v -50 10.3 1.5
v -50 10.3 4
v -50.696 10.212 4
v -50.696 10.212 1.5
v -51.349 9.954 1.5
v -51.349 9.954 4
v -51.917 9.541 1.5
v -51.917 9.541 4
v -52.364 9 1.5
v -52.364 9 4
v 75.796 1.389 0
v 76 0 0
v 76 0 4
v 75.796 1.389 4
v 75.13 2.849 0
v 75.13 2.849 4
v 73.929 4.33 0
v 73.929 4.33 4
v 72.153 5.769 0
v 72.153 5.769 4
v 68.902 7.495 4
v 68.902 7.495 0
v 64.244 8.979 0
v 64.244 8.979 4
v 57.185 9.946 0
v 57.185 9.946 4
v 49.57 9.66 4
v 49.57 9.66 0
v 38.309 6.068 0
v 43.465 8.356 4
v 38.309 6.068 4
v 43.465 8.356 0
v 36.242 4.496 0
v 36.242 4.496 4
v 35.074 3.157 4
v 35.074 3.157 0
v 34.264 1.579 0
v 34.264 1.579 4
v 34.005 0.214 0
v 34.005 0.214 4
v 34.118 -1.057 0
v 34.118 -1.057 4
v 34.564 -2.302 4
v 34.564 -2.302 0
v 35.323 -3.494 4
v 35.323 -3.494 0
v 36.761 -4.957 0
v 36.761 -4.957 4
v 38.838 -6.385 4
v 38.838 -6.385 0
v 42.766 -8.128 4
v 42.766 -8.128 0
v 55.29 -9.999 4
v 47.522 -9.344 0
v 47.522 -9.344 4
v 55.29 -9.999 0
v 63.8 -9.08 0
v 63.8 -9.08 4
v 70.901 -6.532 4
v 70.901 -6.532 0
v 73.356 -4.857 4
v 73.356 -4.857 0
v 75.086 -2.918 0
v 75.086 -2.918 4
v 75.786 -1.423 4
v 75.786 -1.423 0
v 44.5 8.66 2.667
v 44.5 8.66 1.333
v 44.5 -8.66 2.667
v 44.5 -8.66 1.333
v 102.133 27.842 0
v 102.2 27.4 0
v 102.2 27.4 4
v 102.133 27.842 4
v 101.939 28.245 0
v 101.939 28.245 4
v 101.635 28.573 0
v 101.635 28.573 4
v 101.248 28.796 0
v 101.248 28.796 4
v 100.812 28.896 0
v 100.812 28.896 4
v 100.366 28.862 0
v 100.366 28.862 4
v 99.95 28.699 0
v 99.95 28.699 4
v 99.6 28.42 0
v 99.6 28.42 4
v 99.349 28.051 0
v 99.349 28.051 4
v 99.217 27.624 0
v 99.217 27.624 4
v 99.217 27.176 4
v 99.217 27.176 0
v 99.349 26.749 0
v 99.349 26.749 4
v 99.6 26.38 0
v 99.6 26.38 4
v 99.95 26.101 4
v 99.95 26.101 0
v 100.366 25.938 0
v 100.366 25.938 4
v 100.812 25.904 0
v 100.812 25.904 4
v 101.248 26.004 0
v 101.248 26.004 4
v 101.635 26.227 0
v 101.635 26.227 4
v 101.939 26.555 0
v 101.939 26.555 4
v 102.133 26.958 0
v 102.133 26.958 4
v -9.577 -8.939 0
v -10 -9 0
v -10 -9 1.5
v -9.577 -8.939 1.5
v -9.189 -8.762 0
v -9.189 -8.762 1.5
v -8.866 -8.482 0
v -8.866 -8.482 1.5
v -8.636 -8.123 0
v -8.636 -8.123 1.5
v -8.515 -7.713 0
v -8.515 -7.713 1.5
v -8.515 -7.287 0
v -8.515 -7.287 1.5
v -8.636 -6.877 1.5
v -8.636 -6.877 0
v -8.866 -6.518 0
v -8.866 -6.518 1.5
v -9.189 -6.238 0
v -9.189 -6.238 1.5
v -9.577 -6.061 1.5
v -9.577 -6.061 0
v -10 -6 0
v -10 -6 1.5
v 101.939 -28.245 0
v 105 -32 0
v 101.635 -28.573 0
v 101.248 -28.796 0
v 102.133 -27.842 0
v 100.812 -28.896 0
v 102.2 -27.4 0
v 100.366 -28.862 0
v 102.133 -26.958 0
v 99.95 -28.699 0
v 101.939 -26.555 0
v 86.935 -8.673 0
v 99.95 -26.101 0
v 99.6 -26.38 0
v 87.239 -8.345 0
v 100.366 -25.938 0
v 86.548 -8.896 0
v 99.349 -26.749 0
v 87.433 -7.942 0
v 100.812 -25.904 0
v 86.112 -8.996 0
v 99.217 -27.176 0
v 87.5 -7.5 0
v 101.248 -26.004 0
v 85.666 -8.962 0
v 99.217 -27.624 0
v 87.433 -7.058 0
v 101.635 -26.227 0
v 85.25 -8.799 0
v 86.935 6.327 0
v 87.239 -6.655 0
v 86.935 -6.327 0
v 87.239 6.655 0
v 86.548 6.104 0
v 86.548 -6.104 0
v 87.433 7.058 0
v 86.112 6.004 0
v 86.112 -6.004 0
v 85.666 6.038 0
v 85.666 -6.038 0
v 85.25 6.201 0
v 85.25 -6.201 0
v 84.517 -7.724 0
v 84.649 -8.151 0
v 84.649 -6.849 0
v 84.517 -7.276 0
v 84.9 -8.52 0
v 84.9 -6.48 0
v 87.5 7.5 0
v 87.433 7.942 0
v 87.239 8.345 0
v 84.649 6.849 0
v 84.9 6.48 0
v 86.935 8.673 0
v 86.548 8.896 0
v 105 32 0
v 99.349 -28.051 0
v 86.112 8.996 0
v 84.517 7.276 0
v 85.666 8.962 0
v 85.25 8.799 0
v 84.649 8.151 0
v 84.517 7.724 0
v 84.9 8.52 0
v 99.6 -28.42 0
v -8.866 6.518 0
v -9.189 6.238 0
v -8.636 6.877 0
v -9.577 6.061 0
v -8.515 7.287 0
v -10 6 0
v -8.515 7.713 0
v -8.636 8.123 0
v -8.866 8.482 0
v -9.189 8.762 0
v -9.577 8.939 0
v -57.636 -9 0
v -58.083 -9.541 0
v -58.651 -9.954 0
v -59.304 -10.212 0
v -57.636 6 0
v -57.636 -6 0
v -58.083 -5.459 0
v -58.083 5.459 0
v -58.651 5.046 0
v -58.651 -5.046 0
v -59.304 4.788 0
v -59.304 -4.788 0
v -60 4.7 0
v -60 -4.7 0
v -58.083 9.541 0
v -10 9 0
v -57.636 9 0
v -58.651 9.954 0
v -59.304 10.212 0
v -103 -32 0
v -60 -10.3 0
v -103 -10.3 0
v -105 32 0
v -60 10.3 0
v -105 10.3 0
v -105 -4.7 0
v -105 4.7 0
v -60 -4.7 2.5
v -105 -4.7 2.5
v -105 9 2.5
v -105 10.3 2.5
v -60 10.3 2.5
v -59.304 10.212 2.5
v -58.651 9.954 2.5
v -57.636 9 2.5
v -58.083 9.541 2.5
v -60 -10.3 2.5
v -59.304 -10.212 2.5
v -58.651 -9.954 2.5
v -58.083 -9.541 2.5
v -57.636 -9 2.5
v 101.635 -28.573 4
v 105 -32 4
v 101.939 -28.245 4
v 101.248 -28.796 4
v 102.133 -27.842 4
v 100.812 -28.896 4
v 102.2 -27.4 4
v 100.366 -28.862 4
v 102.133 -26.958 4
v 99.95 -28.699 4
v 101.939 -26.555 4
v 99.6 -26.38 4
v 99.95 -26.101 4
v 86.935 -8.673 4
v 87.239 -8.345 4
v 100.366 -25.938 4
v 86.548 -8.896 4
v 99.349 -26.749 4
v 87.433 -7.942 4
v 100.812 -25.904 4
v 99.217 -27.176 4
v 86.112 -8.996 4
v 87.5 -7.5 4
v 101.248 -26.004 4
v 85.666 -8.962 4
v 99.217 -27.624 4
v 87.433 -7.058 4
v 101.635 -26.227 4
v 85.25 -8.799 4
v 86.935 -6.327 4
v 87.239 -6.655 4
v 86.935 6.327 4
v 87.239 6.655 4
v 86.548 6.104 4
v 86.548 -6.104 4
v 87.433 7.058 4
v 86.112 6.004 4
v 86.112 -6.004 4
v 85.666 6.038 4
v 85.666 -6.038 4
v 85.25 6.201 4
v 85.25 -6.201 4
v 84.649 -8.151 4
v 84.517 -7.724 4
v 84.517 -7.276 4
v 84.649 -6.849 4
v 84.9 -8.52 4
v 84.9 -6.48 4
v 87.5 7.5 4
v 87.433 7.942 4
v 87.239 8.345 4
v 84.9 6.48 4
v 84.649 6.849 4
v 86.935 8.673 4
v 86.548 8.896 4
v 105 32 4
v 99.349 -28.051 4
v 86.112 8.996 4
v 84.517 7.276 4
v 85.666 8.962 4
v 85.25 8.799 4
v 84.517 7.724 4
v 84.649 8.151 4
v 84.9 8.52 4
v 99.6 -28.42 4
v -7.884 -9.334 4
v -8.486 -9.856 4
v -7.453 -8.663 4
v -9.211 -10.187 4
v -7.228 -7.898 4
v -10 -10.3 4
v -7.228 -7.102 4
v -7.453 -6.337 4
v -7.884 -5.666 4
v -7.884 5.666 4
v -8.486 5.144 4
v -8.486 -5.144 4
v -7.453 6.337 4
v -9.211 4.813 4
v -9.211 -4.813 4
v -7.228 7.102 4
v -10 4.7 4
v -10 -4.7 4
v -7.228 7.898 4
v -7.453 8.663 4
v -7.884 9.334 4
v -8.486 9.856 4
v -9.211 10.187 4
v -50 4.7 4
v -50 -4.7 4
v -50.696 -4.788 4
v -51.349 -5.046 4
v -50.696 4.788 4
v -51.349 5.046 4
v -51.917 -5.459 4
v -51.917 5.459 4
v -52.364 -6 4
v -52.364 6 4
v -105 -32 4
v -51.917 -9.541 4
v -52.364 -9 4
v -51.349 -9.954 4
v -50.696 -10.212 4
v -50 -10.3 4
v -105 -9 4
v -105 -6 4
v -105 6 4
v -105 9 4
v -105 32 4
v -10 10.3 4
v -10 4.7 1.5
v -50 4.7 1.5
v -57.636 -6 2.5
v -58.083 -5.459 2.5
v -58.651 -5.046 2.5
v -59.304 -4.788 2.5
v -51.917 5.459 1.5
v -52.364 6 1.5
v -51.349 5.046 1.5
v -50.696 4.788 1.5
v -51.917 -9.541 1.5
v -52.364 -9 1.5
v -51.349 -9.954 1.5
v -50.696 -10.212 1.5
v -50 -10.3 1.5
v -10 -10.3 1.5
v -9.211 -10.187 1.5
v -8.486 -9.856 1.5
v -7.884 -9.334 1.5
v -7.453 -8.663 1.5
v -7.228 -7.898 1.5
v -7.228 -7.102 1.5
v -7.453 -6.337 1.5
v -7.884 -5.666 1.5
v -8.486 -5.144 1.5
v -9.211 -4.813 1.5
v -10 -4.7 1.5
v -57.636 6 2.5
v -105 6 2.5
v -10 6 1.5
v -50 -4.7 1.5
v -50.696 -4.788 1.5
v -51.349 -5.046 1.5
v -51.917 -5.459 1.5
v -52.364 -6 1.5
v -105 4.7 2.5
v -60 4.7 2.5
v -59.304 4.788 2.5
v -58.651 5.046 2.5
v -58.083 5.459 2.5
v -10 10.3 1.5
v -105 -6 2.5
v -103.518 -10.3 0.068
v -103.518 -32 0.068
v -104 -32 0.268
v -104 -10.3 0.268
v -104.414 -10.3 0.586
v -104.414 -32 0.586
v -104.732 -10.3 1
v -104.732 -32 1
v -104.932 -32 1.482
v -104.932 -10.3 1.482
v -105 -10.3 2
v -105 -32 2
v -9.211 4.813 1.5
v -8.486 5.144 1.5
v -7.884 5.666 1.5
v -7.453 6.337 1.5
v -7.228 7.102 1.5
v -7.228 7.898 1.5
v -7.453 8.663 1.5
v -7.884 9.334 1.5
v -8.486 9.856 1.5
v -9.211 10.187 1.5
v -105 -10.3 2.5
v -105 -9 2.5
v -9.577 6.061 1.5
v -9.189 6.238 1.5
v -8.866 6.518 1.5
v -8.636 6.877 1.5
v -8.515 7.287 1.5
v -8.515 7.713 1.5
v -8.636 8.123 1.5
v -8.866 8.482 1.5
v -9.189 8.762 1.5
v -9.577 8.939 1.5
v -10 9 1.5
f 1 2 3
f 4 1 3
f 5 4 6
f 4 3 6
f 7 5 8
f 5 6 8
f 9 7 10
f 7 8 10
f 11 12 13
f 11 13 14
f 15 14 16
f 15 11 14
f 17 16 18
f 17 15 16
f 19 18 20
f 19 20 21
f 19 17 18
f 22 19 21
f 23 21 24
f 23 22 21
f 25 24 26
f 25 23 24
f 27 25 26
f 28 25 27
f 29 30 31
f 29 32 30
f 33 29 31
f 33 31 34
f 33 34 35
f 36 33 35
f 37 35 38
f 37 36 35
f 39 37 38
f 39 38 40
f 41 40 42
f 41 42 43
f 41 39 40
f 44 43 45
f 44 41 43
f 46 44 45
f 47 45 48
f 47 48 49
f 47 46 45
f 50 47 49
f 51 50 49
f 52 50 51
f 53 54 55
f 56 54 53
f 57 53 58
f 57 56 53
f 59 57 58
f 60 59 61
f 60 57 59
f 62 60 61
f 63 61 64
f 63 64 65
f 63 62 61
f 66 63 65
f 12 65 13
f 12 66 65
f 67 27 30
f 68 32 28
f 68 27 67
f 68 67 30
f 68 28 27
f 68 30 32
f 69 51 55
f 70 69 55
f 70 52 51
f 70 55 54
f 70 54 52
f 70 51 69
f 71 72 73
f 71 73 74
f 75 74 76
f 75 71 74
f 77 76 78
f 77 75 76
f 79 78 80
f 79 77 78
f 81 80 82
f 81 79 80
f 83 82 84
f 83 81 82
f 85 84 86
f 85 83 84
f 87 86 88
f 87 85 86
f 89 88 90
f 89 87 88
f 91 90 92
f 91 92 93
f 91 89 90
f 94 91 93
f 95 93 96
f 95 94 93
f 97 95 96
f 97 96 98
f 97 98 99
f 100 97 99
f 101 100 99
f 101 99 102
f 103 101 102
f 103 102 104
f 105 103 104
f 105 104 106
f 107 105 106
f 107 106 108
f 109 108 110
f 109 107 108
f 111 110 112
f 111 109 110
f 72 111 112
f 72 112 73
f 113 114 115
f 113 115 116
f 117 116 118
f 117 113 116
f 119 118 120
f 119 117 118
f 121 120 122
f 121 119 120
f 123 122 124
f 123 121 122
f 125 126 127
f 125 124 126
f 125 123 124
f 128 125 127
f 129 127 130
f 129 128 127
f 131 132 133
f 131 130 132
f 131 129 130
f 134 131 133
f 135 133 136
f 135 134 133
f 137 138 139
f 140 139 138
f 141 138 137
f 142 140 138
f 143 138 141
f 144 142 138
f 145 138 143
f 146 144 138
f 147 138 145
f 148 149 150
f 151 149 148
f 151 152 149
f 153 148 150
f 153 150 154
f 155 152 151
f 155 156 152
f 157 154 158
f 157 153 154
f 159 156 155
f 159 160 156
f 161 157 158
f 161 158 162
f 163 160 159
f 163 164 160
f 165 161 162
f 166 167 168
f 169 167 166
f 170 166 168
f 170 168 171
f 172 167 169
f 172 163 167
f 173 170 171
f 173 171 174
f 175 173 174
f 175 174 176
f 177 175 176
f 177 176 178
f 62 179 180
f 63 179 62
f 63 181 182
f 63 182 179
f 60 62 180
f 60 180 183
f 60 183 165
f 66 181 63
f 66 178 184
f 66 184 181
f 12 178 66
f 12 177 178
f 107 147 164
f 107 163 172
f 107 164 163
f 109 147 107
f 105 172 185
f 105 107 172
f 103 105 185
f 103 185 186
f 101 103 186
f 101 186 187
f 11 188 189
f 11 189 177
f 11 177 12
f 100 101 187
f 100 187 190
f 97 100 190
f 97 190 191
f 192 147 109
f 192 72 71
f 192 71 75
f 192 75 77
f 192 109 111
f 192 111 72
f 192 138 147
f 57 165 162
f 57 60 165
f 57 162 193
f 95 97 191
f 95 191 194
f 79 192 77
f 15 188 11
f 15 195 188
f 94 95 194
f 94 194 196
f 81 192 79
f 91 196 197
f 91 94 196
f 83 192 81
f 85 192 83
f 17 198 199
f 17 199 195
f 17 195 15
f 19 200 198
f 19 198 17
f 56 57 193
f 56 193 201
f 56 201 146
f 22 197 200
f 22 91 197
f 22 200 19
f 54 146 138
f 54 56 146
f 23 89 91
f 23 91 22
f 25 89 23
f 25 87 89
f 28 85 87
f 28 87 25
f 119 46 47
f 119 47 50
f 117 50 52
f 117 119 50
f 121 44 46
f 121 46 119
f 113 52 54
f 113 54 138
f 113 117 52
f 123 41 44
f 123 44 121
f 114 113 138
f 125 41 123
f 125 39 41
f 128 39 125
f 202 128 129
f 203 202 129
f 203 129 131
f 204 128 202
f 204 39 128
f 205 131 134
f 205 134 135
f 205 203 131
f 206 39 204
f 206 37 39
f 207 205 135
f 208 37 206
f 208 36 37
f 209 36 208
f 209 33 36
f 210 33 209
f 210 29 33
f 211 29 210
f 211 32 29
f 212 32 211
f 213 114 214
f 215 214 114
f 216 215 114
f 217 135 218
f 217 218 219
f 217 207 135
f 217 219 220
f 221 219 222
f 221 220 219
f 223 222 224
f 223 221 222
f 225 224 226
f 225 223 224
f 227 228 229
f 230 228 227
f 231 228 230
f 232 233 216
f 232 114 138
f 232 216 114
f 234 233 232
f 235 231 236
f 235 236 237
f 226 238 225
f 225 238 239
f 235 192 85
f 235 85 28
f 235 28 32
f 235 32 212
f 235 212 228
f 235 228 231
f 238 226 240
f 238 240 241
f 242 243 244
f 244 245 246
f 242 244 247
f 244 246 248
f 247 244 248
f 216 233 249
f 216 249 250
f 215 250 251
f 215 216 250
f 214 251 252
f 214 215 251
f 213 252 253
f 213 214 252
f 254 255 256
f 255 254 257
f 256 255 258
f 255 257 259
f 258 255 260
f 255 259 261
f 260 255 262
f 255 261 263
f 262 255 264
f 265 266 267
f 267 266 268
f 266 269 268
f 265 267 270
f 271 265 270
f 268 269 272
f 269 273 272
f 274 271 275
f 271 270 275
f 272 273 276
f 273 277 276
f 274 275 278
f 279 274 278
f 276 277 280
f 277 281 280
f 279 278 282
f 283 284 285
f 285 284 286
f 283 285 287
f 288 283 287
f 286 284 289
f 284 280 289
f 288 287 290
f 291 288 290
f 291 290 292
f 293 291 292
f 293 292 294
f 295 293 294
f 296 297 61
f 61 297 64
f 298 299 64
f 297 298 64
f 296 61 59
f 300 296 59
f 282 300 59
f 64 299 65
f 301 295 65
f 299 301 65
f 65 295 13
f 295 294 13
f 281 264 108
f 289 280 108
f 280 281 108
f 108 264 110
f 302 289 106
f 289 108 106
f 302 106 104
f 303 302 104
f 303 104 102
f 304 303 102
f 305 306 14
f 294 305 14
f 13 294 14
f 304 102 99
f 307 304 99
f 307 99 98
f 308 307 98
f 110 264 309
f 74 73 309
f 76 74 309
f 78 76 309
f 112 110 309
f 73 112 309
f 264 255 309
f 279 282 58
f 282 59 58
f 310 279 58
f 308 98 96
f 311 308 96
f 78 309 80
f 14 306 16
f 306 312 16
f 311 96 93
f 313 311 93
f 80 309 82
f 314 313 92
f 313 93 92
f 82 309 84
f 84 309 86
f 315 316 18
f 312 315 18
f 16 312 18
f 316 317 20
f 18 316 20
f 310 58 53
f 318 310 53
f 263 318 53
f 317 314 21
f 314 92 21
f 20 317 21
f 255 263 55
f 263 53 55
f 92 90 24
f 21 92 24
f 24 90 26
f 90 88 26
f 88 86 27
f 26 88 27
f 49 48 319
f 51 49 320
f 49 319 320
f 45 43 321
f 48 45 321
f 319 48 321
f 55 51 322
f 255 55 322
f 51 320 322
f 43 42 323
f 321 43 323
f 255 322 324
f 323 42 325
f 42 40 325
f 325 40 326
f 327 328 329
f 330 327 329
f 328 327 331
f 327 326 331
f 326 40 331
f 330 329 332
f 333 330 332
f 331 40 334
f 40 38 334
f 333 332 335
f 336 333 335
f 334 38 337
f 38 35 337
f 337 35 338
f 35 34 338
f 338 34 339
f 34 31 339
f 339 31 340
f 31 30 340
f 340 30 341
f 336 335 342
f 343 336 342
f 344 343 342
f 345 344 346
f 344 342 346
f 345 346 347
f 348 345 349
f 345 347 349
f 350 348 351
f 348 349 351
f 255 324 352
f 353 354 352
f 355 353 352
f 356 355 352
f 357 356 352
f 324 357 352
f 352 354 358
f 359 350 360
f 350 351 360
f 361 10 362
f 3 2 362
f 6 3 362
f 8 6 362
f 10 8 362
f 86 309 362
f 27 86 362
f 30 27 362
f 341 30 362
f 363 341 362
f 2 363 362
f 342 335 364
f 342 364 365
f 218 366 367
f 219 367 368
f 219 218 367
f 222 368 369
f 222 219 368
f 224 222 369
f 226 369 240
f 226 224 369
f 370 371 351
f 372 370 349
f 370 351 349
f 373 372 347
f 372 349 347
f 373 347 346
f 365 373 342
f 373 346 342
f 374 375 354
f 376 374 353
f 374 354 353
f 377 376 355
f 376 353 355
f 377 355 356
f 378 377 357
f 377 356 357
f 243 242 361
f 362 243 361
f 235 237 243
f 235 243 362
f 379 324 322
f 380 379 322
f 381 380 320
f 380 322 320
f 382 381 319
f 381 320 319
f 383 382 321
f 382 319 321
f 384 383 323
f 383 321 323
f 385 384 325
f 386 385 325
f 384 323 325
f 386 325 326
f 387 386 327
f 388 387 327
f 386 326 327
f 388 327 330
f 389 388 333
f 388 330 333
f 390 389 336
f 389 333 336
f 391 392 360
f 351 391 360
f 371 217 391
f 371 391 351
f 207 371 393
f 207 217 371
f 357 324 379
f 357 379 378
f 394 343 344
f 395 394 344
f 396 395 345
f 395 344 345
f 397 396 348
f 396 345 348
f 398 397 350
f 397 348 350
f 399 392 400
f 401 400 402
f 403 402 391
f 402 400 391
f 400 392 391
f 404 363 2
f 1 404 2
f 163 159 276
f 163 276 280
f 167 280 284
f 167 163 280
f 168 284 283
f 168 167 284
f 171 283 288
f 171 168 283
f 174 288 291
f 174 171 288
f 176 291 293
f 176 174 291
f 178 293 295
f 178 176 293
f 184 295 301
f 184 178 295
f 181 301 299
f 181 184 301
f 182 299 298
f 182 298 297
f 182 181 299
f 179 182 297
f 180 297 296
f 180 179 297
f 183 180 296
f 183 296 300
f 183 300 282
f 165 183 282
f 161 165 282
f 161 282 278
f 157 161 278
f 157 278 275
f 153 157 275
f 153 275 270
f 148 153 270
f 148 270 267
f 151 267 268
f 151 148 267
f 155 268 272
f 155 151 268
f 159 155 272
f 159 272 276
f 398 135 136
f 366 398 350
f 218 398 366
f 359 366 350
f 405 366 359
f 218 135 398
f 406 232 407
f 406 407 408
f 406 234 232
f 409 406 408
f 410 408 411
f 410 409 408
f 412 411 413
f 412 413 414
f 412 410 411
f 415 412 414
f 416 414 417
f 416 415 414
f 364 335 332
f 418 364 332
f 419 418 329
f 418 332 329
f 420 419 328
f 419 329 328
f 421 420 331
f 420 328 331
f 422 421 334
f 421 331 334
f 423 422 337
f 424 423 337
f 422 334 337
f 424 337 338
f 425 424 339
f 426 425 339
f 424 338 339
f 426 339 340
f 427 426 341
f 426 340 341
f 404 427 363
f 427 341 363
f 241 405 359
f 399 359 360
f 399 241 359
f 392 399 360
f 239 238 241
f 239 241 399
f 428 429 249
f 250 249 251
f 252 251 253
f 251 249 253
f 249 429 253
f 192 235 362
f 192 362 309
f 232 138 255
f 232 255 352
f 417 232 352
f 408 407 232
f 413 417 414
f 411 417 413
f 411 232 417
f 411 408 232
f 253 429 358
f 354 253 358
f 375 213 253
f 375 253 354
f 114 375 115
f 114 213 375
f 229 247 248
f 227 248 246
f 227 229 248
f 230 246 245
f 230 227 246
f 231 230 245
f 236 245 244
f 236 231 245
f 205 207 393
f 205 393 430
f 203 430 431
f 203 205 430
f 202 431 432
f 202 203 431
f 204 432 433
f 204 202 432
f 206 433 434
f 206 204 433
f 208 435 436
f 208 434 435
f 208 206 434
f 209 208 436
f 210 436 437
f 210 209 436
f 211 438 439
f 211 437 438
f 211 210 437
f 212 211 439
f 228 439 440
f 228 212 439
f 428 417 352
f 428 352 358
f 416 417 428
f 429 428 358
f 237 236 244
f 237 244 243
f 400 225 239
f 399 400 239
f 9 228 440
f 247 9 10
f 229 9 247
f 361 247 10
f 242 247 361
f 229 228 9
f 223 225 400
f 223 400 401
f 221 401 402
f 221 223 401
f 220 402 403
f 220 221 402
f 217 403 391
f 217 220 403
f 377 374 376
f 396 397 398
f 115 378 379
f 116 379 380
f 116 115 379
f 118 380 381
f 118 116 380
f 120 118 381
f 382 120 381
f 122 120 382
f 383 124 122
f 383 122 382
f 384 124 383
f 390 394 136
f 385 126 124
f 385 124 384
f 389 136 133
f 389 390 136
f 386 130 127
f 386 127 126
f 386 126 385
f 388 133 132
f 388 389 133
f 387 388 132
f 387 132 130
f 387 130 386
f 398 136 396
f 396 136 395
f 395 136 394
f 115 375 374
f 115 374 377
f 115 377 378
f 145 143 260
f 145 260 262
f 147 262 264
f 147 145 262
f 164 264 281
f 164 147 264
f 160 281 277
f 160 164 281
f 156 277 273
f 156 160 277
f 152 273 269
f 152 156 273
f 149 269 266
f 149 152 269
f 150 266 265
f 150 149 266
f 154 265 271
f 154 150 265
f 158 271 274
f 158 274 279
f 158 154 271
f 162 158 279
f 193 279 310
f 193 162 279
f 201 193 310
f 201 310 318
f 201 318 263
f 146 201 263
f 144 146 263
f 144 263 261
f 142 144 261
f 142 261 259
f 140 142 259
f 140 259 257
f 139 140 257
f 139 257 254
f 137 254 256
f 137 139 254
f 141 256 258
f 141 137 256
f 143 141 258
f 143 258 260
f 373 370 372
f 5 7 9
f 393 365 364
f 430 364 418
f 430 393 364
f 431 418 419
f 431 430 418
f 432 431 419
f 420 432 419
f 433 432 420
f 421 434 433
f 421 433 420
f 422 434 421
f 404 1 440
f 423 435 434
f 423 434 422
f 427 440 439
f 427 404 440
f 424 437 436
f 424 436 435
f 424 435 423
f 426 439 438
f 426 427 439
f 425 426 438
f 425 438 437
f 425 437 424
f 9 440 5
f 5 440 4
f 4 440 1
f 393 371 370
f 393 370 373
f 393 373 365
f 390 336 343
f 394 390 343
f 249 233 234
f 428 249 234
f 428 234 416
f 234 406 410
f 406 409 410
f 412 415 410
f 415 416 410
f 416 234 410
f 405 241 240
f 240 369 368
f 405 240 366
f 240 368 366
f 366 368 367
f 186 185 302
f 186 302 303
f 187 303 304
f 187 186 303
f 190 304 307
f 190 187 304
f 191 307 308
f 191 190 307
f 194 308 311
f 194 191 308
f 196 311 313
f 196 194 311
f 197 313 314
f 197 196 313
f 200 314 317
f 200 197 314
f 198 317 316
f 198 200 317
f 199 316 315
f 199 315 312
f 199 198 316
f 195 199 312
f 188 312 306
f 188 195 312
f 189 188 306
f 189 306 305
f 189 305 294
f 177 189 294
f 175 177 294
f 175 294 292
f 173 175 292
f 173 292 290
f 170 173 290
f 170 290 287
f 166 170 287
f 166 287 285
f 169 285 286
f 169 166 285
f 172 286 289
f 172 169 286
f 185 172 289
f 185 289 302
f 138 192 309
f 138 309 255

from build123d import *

# Parameters (mm, degrees)
SKETCH049_R     = 1.5
PAD014_DEPTH    = 4
POCKET031_DEPTH = 2.5
FILLET001_R     = 2
POCKET038_DEPTH = 2.5


with BuildPart() as part:
    # Sketch049 → Pad014 (new body)
    with BuildSketch(Plane.XY):
        with BuildLine():
            Line((-105, 9), (-105, 32))
            Line((-105, 32), (105, 32))
            Line((105, 32), (105, -32))
            Line((105, -32), (-105, -32))
            Line((-105, -32), (-105, -9))
            Line((-105, -9), (-10, -9))
            ThreePointArc((-10, -9), (-8.5, -7.5), (-10, -6))
            Line((-10, -6), (-105, -6))
            Line((-105, -6), (-105, 6))
            Line((-105, 6), (-10, 6))
            ThreePointArc((-10, 6), (-8.5, 7.5), (-10, 9))
            Line((-10, 9), (-105, 9))
        make_face()
        with Locations((100.7, 27.4)):
            Circle(SKETCH049_R, mode=Mode.SUBTRACT)
        with Locations((86, 7.5)):
            Circle(SKETCH049_R, mode=Mode.SUBTRACT)
        with Locations((86, -7.5)):
            Circle(SKETCH049_R, mode=Mode.SUBTRACT)
        with Locations((100.7, -27.4)):
            Circle(SKETCH049_R, mode=Mode.SUBTRACT)
        with BuildLine():
            add(Edge.make_bspline(
                [(76, 0), (76, 17.3205080757), (44.5, 8.6602540378), (13, 0), (44.5, -8.6602540378), (76, -17.3205080757), (76, 0)],
                knots=[0, 0, 0, 2.0943951024, 2.0943951024, 4.1887902048, 4.1887902048, 6.2831853072, 6.2831853072, 6.2831853072], degree=2, weights=[1, 0.5, 1, 0.5, 1, 0.5, 1]))
        make_face(mode=Mode.SUBTRACT)
    extrude(amount=PAD014_DEPTH)

    # Sketch050 → Pocket031 (cut)
    with BuildSketch(Plane.XY):
        with BuildLine():
            ThreePointArc((-60, 4.7), (-57.2, 7.5), (-60, 10.3))
            Line((-60, 10.3), (-105, 10.3))
            ThreePointArc((-105, 10.3), (-107.8, 7.5), (-105, 4.7))
            Line((-60, 4.7), (-105, 4.7))
        make_face()
        with BuildLine():
            ThreePointArc((-60, -10.3), (-57.2, -7.5), (-60, -4.7))
            Line((-60, -4.7), (-105, -4.7))
            ThreePointArc((-105, -4.7), (-107.8, -7.5), (-105, -10.3))
            Line((-60, -10.3), (-105, -10.3))
        make_face()
    extrude(amount=POCKET031_DEPTH, mode=Mode.SUBTRACT)

    # Fillet001
    fillet001_edges = [part.edges().sort_by_distance(p)[0] for p in [
        (-105, -21.15, 0),
    ]]
    fillet(fillet001_edges, radius=FILLET001_R)

    # Sketch060 → Pocket038 (cut)
    with BuildSketch(Plane.XY.offset(4)):
        with BuildLine():
            ThreePointArc((-10, 4.7), (-7.2, 7.5), (-10, 10.3))
            Line((-10, 10.3), (-50, 10.3))
            ThreePointArc((-50, 10.3), (-52.8, 7.5), (-50, 4.7))
            Line((-10, 4.7), (-50, 4.7))
        make_face()
        with BuildLine():
            ThreePointArc((-10, -10.3), (-7.2, -7.5), (-10, -4.7))
            Line((-10, -4.7), (-50, -4.7))
            ThreePointArc((-50, -4.7), (-52.8, -7.5), (-50, -10.3))
            Line((-10, -10.3), (-50, -10.3))
        make_face()
    extrude(amount=-POCKET038_DEPTH, mode=Mode.SUBTRACT)


solid = part.part
